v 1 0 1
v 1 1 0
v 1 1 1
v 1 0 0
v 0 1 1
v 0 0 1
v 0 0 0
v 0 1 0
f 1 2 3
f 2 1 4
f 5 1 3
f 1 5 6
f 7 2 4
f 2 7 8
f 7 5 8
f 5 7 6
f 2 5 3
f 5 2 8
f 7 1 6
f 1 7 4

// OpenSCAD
// Evaluation fixture: control flow in statements.

for (i = [0 : 2]) echo("range", i);
for (i = [5 : -2 : 0]) echo("descending", i);
for (i = [0 : 0.5 : 1.5]) echo("fractional", i);
for (a = [1, 2], b = ["x", "y"]) echo("pairs", a, b);
for (v = [[1, 2], [3, 4]]) echo("rows", v);
for (i = [3 : 1]) echo("never printed");
for (n = 7) echo("scalar iterates once", n);

for (i = [1 : 3])
    if (i == 2)
        echo("two");
    else
        echo("not two", i);

if (1 > 2) echo("wrong");
else if (2 > 1) echo("else-if branch");
else echo("wrong");

let (n = 3, m = n * 2) for (i = [1 : n]) echo("let and for", i, m);

module twice(n) {
    for (i = [1 : n]) {
        echo("body", i);
        if (i == n) echo("last");
    }
}
twice(2);

intersection_for (i = [1 : 3]) {
    echo("intersection_for body", i);
    cube(i);
}

echo("assert statement follows");
assert(true);
